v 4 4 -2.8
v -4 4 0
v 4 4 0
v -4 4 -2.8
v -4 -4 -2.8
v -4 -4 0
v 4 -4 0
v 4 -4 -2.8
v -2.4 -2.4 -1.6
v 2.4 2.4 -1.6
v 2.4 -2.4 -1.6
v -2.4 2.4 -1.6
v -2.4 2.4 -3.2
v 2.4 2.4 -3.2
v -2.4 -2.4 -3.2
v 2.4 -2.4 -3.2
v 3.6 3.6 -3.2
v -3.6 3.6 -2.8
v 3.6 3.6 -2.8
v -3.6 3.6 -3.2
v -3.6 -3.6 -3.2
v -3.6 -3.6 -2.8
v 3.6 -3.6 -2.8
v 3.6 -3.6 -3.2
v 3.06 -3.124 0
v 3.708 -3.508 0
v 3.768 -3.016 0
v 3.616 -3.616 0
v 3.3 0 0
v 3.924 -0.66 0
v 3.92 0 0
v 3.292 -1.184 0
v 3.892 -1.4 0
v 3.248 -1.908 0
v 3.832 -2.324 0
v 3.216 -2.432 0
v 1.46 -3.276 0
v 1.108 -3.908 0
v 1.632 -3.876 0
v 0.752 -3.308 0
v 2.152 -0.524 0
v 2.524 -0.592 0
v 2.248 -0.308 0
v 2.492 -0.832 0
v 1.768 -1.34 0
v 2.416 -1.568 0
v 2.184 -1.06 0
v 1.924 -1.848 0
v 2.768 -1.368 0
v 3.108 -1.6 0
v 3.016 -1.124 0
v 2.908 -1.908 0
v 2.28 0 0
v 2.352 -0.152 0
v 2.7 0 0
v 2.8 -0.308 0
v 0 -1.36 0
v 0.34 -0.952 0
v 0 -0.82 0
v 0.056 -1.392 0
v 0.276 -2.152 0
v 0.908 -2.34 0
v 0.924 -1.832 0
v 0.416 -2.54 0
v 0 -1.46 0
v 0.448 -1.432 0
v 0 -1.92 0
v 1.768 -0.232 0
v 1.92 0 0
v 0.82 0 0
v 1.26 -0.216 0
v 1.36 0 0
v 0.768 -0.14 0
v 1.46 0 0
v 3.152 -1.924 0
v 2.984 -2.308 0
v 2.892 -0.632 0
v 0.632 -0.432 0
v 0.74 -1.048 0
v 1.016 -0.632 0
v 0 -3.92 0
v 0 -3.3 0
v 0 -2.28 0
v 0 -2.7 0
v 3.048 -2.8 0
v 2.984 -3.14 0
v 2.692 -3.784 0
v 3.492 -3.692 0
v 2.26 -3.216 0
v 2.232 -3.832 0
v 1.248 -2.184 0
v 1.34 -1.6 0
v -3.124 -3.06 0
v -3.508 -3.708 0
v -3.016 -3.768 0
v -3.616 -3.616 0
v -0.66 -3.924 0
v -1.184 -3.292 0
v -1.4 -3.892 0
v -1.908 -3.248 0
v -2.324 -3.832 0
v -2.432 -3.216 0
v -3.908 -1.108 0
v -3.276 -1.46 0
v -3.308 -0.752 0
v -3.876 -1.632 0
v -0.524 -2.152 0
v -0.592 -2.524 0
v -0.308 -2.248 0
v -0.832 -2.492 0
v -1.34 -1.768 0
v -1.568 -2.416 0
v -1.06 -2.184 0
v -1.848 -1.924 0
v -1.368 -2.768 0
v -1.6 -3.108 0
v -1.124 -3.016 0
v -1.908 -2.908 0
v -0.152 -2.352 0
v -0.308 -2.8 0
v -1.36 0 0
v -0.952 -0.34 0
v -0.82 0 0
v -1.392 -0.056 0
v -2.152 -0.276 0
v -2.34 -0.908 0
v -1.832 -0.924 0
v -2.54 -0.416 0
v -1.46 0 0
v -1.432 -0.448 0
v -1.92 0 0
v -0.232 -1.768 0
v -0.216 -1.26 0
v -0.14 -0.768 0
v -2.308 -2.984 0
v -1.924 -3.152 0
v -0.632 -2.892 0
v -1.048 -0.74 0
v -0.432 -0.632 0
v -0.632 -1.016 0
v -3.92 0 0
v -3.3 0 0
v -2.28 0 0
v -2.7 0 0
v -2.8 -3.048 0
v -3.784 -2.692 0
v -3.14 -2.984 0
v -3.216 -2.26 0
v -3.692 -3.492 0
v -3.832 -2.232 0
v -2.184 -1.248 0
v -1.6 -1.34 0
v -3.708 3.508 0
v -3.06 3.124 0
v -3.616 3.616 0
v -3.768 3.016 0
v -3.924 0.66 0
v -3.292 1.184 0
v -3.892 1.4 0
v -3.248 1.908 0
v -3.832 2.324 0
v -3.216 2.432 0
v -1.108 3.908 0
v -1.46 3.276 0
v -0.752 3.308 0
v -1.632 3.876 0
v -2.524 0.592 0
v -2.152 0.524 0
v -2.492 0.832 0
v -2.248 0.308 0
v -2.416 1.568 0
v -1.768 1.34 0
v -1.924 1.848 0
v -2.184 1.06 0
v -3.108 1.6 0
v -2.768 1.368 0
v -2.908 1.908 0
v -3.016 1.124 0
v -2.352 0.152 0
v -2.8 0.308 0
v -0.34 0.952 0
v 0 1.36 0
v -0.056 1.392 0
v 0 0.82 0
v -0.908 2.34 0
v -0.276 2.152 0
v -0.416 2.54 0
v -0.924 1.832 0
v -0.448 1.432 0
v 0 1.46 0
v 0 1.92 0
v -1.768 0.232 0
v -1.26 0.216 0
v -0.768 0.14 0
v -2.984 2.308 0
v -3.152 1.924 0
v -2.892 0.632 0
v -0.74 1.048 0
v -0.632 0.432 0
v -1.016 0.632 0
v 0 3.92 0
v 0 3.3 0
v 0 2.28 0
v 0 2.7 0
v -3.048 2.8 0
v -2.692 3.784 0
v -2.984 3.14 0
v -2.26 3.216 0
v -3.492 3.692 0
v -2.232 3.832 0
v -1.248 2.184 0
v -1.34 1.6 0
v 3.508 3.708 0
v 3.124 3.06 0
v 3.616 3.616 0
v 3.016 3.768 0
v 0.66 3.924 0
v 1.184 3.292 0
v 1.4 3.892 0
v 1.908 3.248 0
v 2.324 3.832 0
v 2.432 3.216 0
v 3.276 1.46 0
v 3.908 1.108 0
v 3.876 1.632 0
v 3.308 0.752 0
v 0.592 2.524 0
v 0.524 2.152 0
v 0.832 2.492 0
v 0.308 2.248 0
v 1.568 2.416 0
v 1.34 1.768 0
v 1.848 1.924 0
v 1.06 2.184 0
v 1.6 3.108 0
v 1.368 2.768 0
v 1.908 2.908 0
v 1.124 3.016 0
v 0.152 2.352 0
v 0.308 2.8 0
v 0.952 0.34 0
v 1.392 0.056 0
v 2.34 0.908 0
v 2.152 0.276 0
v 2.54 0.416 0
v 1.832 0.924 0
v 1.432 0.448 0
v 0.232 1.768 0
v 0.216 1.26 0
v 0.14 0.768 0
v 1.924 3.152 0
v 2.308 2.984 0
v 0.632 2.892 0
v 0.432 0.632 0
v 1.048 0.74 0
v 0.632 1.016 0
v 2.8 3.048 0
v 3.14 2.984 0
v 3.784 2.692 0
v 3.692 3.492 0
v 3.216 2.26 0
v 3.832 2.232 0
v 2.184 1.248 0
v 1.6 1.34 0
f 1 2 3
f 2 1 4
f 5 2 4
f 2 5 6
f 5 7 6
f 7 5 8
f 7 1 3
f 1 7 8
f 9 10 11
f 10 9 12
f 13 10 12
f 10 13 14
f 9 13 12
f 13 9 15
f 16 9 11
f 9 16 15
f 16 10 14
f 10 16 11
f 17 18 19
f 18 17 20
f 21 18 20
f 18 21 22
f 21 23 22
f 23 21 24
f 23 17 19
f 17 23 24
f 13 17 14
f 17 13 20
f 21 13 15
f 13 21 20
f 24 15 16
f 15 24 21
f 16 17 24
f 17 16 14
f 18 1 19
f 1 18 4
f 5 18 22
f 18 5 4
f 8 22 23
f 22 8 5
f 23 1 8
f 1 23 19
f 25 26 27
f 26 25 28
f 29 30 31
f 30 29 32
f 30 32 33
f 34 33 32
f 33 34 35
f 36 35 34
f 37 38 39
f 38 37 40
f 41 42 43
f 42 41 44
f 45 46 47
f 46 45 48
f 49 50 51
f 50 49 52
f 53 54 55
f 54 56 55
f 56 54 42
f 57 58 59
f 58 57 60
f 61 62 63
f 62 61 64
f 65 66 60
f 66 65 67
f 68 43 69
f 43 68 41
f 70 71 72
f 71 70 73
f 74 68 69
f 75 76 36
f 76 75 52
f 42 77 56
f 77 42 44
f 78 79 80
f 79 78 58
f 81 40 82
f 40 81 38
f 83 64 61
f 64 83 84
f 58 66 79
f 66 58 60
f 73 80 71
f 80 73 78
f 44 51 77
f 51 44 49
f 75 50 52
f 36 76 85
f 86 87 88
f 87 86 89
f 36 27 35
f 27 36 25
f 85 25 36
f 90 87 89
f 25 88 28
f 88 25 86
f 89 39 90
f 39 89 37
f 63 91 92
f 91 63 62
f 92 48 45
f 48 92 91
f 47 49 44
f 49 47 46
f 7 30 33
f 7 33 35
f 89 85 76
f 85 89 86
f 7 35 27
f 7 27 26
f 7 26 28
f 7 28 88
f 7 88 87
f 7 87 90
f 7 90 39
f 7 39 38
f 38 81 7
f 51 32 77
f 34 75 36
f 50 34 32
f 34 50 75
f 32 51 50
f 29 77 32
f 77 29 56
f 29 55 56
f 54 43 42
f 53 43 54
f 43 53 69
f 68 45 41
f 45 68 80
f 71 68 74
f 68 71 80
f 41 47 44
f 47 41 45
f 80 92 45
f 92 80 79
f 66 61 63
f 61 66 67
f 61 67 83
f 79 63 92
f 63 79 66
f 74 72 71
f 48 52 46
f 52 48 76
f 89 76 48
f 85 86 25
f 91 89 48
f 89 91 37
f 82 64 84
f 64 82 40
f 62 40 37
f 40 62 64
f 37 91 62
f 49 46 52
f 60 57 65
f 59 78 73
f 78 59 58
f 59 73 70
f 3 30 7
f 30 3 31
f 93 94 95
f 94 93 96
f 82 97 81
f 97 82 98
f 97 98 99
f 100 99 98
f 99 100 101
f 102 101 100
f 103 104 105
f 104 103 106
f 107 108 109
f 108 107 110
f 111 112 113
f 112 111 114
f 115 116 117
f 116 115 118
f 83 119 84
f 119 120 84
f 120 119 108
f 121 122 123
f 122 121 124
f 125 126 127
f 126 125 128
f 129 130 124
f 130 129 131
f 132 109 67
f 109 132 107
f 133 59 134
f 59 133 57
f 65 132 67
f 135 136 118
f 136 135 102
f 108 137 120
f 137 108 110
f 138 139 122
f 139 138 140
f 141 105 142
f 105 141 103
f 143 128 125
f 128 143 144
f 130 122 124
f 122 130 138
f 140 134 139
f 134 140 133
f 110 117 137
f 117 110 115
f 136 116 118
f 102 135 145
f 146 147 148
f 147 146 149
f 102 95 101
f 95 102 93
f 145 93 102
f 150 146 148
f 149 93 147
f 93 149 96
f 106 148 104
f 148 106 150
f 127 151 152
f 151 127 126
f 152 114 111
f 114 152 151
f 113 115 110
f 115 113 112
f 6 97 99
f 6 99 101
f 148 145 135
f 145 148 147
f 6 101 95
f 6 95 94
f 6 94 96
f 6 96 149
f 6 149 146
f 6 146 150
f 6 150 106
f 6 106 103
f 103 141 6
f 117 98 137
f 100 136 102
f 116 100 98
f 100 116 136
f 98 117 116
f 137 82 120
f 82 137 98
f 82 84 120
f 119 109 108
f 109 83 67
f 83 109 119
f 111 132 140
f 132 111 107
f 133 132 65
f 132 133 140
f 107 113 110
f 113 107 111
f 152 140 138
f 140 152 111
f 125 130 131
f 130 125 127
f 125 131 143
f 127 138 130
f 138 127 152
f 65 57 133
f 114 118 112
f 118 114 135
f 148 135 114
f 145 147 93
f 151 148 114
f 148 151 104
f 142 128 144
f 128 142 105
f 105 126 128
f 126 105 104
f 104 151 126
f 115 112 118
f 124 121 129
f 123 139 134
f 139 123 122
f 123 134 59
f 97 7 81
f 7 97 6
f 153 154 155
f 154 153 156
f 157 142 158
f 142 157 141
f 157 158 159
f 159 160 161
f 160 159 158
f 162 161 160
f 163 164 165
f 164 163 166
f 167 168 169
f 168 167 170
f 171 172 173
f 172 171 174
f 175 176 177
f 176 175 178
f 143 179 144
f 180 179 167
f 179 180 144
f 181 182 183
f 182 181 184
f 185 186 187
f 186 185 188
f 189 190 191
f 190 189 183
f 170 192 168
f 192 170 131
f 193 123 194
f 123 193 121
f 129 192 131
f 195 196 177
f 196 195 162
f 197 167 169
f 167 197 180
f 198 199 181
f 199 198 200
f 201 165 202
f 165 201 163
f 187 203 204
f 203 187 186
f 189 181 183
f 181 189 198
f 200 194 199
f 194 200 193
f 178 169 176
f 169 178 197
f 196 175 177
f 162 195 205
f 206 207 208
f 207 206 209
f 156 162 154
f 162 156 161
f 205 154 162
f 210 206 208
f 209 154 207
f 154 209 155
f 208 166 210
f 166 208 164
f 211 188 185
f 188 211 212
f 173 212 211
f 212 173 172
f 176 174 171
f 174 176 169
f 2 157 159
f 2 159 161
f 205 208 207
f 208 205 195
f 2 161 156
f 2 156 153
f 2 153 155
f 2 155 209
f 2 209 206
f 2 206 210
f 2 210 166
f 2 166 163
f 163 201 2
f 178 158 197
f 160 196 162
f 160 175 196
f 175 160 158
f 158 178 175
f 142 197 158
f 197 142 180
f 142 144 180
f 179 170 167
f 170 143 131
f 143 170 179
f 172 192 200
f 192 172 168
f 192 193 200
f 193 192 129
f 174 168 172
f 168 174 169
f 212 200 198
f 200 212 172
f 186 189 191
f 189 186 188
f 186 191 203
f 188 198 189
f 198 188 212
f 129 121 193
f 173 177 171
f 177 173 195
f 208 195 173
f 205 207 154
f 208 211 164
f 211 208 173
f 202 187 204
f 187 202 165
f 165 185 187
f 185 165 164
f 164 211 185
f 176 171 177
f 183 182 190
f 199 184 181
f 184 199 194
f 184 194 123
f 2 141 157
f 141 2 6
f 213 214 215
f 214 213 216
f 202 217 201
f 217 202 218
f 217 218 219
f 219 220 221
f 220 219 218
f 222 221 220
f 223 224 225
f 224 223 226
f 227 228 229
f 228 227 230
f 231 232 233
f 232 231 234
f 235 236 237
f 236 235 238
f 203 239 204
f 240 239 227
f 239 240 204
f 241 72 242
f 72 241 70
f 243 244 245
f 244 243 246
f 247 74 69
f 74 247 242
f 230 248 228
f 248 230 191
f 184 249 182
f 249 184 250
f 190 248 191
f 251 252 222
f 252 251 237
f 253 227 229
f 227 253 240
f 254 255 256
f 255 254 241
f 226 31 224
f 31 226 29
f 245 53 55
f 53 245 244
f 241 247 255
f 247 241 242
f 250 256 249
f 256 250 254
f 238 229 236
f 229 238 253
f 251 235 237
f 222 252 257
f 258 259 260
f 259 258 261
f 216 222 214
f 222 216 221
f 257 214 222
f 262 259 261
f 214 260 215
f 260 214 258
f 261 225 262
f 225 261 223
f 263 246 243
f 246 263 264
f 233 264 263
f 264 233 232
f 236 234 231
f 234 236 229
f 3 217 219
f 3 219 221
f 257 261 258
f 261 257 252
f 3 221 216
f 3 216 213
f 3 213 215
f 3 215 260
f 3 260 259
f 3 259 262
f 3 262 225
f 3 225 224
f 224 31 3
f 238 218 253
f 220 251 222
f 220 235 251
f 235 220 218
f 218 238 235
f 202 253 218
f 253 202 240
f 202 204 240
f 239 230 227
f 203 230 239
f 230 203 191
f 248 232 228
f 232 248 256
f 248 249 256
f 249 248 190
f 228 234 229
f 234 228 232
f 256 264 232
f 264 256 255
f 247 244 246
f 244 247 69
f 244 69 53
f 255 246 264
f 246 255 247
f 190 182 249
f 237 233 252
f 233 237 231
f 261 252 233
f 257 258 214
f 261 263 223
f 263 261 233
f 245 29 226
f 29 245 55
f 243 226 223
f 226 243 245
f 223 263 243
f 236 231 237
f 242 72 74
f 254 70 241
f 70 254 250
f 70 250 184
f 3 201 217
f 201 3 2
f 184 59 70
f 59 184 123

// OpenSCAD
// file: ../p/box5.scad
use <../lib.scad>
function ldraw_lib__box5() = [
// 0 Box with 5 Faces and All Edges
// 0 Name: box5.dat
// 0 Author: James Jessiman
// 0 !LDRAW_ORG Primitive UPDATE 2012-01
// 0 !LICENSE Licensed under CC BY 4.0 : see CAreadme.txt
// 
// 0 BFC CERTIFY CCW
  [0,"BFC","CERTIFY"],
  [0,"BFC","CCW"],
// 
// 0 !HISTORY 2002-04-03 [sbliss] Modified for BFC compliance
// 0 !HISTORY 2002-04-25 [PTadmin] Official Update 2002-02
// 0 !HISTORY 2007-06-24 [PTadmin] Header formatted for Contributor Agreement
// 0 !HISTORY 2008-07-01 [PTadmin] Official Update 2008-01
// 0 !HISTORY 2012-02-16 [Philo] Changed to CCW
// 0 !HISTORY 2012-03-30 [PTadmin] Official Update 2012-01
// 
// 
// 2 24 1 1 1 -1 1 1
  [2,24,1,1,1,-1,1,1],
// 2 24 -1 1 1 -1 1 -1
  [2,24,-1,1,1,-1,1,-1],
// 2 24 -1 1 -1 1 1 -1
  [2,24,-1,1,-1,1,1,-1],
// 2 24 1 1 -1 1 1 1
  [2,24,1,1,-1,1,1,1],
// 2 24 1 0 1 -1 0 1
  [2,24,1,0,1,-1,0,1],
// 2 24 -1 0 1 -1 0 -1
  [2,24,-1,0,1,-1,0,-1],
// 2 24 -1 0 -1 1 0 -1
  [2,24,-1,0,-1,1,0,-1],
// 2 24 1 0 -1 1 0 1
  [2,24,1,0,-1,1,0,1],
// 2 24 1 0 1 1 1 1
  [2,24,1,0,1,1,1,1],
// 2 24 -1 0 1 -1 1 1
  [2,24,-1,0,1,-1,1,1],
// 2 24 1 0 -1 1 1 -1
  [2,24,1,0,-1,1,1,-1],
// 2 24 -1 0 -1 -1 1 -1
  [2,24,-1,0,-1,-1,1,-1],
// 4 16 -1 1 1 1 1 1 1 1 -1 -1 1 -1
  [4,16,-1,1,1,1,1,1,1,1,-1,-1,1,-1],
// 4 16 -1 1 1 -1 0 1 1 0 1 1 1 1
  [4,16,-1,1,1,-1,0,1,1,0,1,1,1,1],
// 4 16 -1 1 -1 -1 0 -1 -1 0 1 -1 1 1
  [4,16,-1,1,-1,-1,0,-1,-1,0,1,-1,1,1],
// 4 16 1 1 -1 1 0 -1 -1 0 -1 -1 1 -1
  [4,16,1,1,-1,1,0,-1,-1,0,-1,-1,1,-1],
// 4 16 1 1 1 1 0 1 1 0 -1 1 1 -1
  [4,16,1,1,1,1,0,1,1,0,-1,1,1,-1],
];
module ldraw_lib__box5(step=0, col=false, unit=2/5, alt=false, line=0.2, solid=!$preview)
    makepoly(ldraw_lib__box5(), step=step, col=col, unit=unit, alt=alt, line=line, solid=solid);
ldraw_lib__box5(line=0.2);
// file: ../p/box4.scad
use <../lib.scad>
function ldraw_lib__box4() = [
// 0 Box with 4 Faces (2 Parallel Pairs) and All Edges
// 0 Name: box4.dat
// 0 Author: James Jessiman
// 0 !LDRAW_ORG Primitive UPDATE 2012-01
// 0 !LICENSE Licensed under CC BY 4.0 : see CAreadme.txt
// 
// 0 BFC CERTIFY CCW
  [0,"BFC","CERTIFY"],
  [0,"BFC","CCW"],
// 
// 0 !HISTORY 2002-04-03 [sbliss] Modified for BFC compliance
// 0 !HISTORY 2002-04-25 [PTadmin] Official Update 2002-02
// 0 !HISTORY 2007-06-24 [PTadmin] Header formatted for Contributor Agreement
// 0 !HISTORY 2008-07-01 [PTadmin] Official Update 2008-01
// 0 !HISTORY 2012-02-16 [Philo] Changed to CCW
// 0 !HISTORY 2012-03-30 [PTadmin] Official Update 2012-01
// 
// 
// 2 24 1 1 1 -1 1 1
  [2,24,1,1,1,-1,1,1],
// 2 24 -1 1 1 -1 1 -1
  [2,24,-1,1,1,-1,1,-1],
// 2 24 -1 1 -1 1 1 -1
  [2,24,-1,1,-1,1,1,-1],
// 2 24 1 1 -1 1 1 1
  [2,24,1,1,-1,1,1,1],
// 2 24 1 0 1 -1 0 1
  [2,24,1,0,1,-1,0,1],
// 2 24 -1 0 1 -1 0 -1
  [2,24,-1,0,1,-1,0,-1],
// 2 24 -1 0 -1 1 0 -1
  [2,24,-1,0,-1,1,0,-1],
// 2 24 1 0 -1 1 0 1
  [2,24,1,0,-1,1,0,1],
// 2 24 1 0 1 1 1 1
  [2,24,1,0,1,1,1,1],
// 2 24 -1 0 1 -1 1 1
  [2,24,-1,0,1,-1,1,1],
// 2 24 1 0 -1 1 1 -1
  [2,24,1,0,-1,1,1,-1],
// 2 24 -1 0 -1 -1 1 -1
  [2,24,-1,0,-1,-1,1,-1],
// 4 16 -1 1 1 -1 0 1 1 0 1 1 1 1
  [4,16,-1,1,1,-1,0,1,1,0,1,1,1,1],
// 4 16 -1 1 -1 -1 0 -1 -1 0 1 -1 1 1
  [4,16,-1,1,-1,-1,0,-1,-1,0,1,-1,1,1],
// 4 16 1 1 -1 1 0 -1 -1 0 -1 -1 1 -1
  [4,16,1,1,-1,1,0,-1,-1,0,-1,-1,1,-1],
// 4 16 1 1 1 1 0 1 1 0 -1 1 1 -1
  [4,16,1,1,1,1,0,1,1,0,-1,1,1,-1],
];
module ldraw_lib__box4(step=0, col=false, unit=2/5, alt=false, line=0.2, solid=!$preview)
    makepoly(ldraw_lib__box4(), step=step, col=col, unit=unit, alt=alt, line=line, solid=solid);
ldraw_lib__box4(line=0.2);
// file: s/3070bs01.scad
use <../../lib.scad>
use <../../p/box4.scad>
use <../../p/box5.scad>
function ldraw_lib__s__3070bs01() = [
// 0 ~Tile  1 x  1 with Groove without Top Face
// 0 Name: s\3070bs01.dat
// 0 Author: Chris Dee [cwdee]
// 0 !LDRAW_ORG Subpart UPDATE 2009-02
// 0 !LICENSE Licensed under CC BY 4.0 : see CAreadme.txt
// 
// 0 BFC CERTIFY CCW
  [0,"BFC","CERTIFY"],
  [0,"BFC","CCW"],
// 
// 0 !HISTORY 2009-09-03 [PTadmin] Official Update 2009-02
// 
// 
// 1 16 0 0 0 10 0 0 0 7 0 0 0 10 box4.dat
  [1,16,0,0,0,10,0,0,0,7,0,0,0,10, ldraw_lib__box4()],
// 0 BFC INVERTNEXT
  [0,"BFC","INVERTNEXT"],
// 1 16 0 8 0 6 0 0 0 -4 0 0 0 6 box5.dat
  [1,16,0,8,0,6,0,0,0,-4,0,0,0,6, ldraw_lib__box5()],
// 1 16 0 7 0 9 0 0 0 1 0 0 0 9 box4.dat
  [1,16,0,7,0,9,0,0,0,1,0,0,0,9, ldraw_lib__box4()],
// 
// 4 16 9 8 9 6 8 6 -6 8 6 -9 8 9
  [4,16,9,8,9,6,8,6,-6,8,6,-9,8,9],
// 4 16 -9 8 9 -6 8 6 -6 8 -6 -9 8 -9
  [4,16,-9,8,9,-6,8,6,-6,8,-6,-9,8,-9],
// 4 16 -9 8 -9 -6 8 -6 6 8 -6 9 8 -9
  [4,16,-9,8,-9,-6,8,-6,6,8,-6,9,8,-9],
// 4 16 9 8 -9 6 8 -6 6 8 6 9 8 9
  [4,16,9,8,-9,6,8,-6,6,8,6,9,8,9],
// 
// 4 16 10 7 10 9 7 9 -9 7 9 -10 7 10
  [4,16,10,7,10,9,7,9,-9,7,9,-10,7,10],
// 4 16 -10 7 10 -9 7 9 -9 7 -9 -10 7 -10
  [4,16,-10,7,10,-9,7,9,-9,7,-9,-10,7,-10],
// 4 16 -10 7 -10 -9 7 -9 9 7 -9 10 7 -10
  [4,16,-10,7,-10,-9,7,-9,9,7,-9,10,7,-10],
// 4 16 10 7 -10 9 7 -9 9 7 9 10 7 10
  [4,16,10,7,-10,9,7,-9,9,7,9,10,7,10],
// 0
];
module ldraw_lib__s__3070bs01(step=0, col=false, unit=2/5, alt=false, line=0.2, solid=!$preview)
    makepoly(ldraw_lib__s__3070bs01(), step=step, col=col, unit=unit, alt=alt, line=line, solid=solid);
ldraw_lib__s__3070bs01(line=0.2);
// main file
use <../lib.scad>
use <s/3070bp1ns01.scad>
use <s/3070bs01.scad>
function ldraw_lib__3070bp1n() = [
// 0 Tile  1 x  1 with Metallic Silver Rotating Squares Pattern
// 0 Name: 3070bp1n.dat
// 0 Author: Vincent Messenet [Cheenzo]
// 0 !LDRAW_ORG Part UPDATE 2024-06
// 0 !LICENSE Licensed under CC BY 4.0 : see CAreadme.txt
// 
// 0 BFC CERTIFY CCW
  [0,"BFC","CERTIFY"],
  [0,"BFC","CCW"],
// 
// 0 !KEYWORDS Bricklink 3070pb347, Disney, Set 30661, Set 43223, Set 43224
// 0 !KEYWORDS Set 43231, Wish
// 
// 0 !HISTORY 2024-07-29 [OrionP] Official Update 2024-06
// 
// 1 16 0 0 0 1 0 0 0 1 0 0 0 1 s\3070bs01.dat
  [1,16,0,0,0,1,0,0,0,1,0,0,0,1, ldraw_lib__s__3070bs01()],
// 1 16 0 0 0 1 0 0 0 1 0 0 0 1 s\3070bp1ns01.dat
  [1,16,0,0,0,1,0,0,0,1,0,0,0,1, ldraw_lib__s__3070bp1ns01()],
// 1 16 0 0 0 0 0 1 0 1 0 -1 0 0 s\3070bp1ns01.dat
  [1,16,0,0,0,0,0,1,0,1,0,-1,0,0, ldraw_lib__s__3070bp1ns01()],
// 1 16 0 0 0 -1 0 0 0 1 0 0 0 -1 s\3070bp1ns01.dat
  [1,16,0,0,0,-1,0,0,0,1,0,0,0,-1, ldraw_lib__s__3070bp1ns01()],
// 1 16 0 0 0 0 0 -1 0 1 0 1 0 0 s\3070bp1ns01.dat
  [1,16,0,0,0,0,0,-1,0,1,0,1,0,0, ldraw_lib__s__3070bp1ns01()],
// 4 16 0 0 2.05 -2.05 0 0 0 0 -2.05 2.05 0 0
  [4,16,0,0,2.05,-2.05,0,0,0,0,-2.05,2.05,0,0],
];
module ldraw_lib__3070bp1n(step=0, col=false, unit=2/5, alt=false, line=0.2, solid=!$preview)
    makepoly(ldraw_lib__3070bp1n(), step=step, col=col, unit=unit, alt=alt, line=line, solid=solid);
ldraw_lib__3070bp1n(line=0.2);
